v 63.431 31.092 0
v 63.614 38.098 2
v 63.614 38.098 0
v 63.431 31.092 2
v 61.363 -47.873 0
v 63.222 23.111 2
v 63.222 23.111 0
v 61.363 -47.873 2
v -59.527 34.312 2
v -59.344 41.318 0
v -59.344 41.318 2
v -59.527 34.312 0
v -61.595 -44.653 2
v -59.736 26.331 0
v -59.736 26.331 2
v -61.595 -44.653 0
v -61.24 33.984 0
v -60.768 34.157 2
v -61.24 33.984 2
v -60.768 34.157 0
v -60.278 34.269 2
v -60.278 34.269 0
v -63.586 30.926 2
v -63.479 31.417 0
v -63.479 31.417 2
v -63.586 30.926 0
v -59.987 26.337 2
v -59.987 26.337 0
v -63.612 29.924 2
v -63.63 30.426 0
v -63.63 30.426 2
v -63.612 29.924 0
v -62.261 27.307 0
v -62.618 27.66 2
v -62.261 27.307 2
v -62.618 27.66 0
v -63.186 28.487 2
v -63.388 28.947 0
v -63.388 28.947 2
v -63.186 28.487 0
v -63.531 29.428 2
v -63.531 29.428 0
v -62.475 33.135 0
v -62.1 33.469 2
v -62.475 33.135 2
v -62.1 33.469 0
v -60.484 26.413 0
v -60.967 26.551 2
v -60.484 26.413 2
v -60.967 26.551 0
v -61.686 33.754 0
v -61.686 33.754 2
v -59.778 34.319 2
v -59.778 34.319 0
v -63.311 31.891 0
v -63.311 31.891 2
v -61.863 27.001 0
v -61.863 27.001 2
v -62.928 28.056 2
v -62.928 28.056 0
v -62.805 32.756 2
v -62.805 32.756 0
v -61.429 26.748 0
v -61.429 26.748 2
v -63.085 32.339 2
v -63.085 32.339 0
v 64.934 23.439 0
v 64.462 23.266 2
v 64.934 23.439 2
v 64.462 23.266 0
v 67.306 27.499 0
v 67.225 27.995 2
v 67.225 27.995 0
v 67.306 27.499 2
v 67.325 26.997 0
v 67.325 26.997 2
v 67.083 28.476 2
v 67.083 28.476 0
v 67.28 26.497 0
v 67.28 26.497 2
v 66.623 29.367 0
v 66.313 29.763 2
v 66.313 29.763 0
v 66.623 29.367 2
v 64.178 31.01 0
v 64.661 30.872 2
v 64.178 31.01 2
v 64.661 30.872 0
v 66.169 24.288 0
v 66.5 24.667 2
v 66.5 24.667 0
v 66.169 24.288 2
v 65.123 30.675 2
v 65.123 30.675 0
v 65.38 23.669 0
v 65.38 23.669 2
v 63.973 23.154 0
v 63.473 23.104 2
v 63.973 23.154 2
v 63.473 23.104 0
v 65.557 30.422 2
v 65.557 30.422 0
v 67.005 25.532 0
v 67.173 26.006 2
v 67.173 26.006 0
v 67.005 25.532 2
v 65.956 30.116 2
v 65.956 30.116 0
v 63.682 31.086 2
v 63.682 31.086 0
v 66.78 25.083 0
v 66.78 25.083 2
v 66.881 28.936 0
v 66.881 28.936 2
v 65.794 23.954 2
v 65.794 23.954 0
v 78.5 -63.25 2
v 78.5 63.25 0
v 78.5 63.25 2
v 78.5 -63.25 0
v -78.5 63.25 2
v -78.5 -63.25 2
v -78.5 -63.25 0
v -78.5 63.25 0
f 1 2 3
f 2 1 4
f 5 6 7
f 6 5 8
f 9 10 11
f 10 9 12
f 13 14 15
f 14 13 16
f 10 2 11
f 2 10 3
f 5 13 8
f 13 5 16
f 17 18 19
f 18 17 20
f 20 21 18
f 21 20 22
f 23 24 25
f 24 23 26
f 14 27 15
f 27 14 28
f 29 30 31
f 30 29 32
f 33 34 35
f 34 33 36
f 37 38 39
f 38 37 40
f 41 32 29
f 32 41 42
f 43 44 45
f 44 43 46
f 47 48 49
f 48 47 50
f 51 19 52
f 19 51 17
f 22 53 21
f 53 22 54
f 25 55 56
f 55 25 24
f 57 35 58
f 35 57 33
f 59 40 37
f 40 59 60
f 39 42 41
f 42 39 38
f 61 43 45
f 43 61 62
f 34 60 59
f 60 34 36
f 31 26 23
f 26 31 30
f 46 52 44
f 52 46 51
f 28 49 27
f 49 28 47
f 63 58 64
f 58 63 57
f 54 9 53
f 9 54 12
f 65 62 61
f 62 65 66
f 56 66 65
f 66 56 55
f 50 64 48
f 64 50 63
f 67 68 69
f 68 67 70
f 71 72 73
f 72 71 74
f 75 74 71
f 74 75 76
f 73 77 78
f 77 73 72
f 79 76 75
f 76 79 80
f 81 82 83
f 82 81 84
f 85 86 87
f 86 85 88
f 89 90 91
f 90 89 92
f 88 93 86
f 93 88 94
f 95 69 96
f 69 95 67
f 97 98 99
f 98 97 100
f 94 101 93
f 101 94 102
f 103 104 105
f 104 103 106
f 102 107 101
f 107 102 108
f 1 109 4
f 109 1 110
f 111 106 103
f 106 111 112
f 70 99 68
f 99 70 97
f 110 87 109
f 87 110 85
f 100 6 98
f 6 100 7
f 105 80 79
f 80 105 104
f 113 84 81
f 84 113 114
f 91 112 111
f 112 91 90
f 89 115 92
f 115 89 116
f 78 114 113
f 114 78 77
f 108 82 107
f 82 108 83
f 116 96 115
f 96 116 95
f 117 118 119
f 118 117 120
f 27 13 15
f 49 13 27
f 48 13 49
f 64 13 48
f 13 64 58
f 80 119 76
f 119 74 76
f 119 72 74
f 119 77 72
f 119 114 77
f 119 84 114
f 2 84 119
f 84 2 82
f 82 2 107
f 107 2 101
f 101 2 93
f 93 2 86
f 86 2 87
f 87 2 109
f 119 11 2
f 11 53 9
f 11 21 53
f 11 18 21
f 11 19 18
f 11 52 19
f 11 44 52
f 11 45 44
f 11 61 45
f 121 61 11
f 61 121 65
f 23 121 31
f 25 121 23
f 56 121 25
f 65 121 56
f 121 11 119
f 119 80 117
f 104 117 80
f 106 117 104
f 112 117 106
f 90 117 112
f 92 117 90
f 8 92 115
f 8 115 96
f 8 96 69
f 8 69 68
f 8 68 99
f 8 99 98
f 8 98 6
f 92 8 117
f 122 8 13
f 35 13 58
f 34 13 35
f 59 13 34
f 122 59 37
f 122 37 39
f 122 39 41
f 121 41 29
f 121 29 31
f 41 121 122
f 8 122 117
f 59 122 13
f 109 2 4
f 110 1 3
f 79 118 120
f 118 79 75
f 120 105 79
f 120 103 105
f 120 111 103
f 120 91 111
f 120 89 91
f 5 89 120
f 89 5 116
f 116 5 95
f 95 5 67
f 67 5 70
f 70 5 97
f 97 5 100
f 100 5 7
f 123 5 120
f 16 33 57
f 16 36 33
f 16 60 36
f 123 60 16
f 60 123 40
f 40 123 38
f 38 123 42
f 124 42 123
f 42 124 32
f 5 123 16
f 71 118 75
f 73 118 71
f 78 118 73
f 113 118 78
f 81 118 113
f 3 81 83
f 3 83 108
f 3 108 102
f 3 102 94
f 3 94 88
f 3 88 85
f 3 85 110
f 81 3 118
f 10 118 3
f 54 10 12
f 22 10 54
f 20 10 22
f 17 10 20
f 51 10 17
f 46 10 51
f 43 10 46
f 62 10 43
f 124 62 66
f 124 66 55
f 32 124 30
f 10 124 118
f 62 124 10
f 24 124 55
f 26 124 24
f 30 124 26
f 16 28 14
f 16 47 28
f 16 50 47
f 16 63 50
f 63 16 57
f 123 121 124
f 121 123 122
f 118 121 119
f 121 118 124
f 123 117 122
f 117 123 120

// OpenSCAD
/* This piece was designed by Shawn French (McMaster University, Ontario, Canada)
It is part of the SCIFIcube (SCIentific Fluorescence Imaging cube), a small and portable 3D-printed
fluorescence imager for bacteria, yeast, or any colony-forming organism.  It works well with solid
agar medium, and can image high density samples rapidly over time.  

Details can be found at https://www.github.com/sfrench007/scificube

Copyright 2017 McMaster University

Redistribution and use in source and binary forms, with or without modification, are permitted provided that the following conditions are met:

1. Redistributions of source code must retain the above copyright notice, this list of conditions and the following disclaimer.

2. Redistributions in binary form must reproduce the above copyright notice, this list of conditions and the following disclaimer in the documentation and/or other materials provided with the distribution.

3. Neither the name of the copyright holder nor the names of its contributors may be used to endorse or promote products derived from this software without specific prior written permission.

THIS SOFTWARE IS PROVIDED BY THE COPYRIGHT HOLDERS AND CONTRIBUTORS "AS IS" AND ANY EXPRESS OR IMPLIED WARRANTIES, INCLUDING, BUT NOT LIMITED TO, THE IMPLIED WARRANTIES OF MERCHANTABILITY AND FITNESS FOR A PARTICULAR PURPOSE ARE DISCLAIMED. IN NO EVENT SHALL THE COPYRIGHT HOLDER OR CONTRIBUTORS BE LIABLE FOR ANY DIRECT, INDIRECT, INCIDENTAL, SPECIAL, EXEMPLARY, OR CONSEQUENTIAL DAMAGES (INCLUDING, BUT NOT LIMITED TO, PROCUREMENT OF SUBSTITUTE GOODS OR SERVICES; LOSS OF USE, DATA, OR PROFITS; OR BUSINESS INTERRUPTION) HOWEVER CAUSED AND ON ANY THEORY OF LIABILITY, WHETHER IN CONTRACT, STRICT LIABILITY, OR TORT (INCLUDING NEGLIGENCE OR OTHERWISE) ARISING IN ANY WAY OUT OF THE USE OF THIS SOFTWARE, EVEN IF ADVISED OF THE POSSIBILITY OF SUCH DAMAGE.

*/

difference() {
    translate([-(157/2),-(126.5/2),0]) cube(size=[157,126.5,2],center=false);
    rotate(a=-1.5,v=[0,0,1]) {
        // This will be camera dependent
        translate([1.095,-3.25,0])
        union() {
            translate([-(123/2),-(86/2),-1]) cube(size=[123,86,4],center=false);
            translate([-(123/2),(86/2)-11,-1]) cylinder(r1=4,r2=4,h=4,$fn=50,center=false);
            translate([(123/2),(86/2)-11,-1]) cylinder(r1=4,r2=4,h=4,$fn=50,center=false);
        }
    }
}
